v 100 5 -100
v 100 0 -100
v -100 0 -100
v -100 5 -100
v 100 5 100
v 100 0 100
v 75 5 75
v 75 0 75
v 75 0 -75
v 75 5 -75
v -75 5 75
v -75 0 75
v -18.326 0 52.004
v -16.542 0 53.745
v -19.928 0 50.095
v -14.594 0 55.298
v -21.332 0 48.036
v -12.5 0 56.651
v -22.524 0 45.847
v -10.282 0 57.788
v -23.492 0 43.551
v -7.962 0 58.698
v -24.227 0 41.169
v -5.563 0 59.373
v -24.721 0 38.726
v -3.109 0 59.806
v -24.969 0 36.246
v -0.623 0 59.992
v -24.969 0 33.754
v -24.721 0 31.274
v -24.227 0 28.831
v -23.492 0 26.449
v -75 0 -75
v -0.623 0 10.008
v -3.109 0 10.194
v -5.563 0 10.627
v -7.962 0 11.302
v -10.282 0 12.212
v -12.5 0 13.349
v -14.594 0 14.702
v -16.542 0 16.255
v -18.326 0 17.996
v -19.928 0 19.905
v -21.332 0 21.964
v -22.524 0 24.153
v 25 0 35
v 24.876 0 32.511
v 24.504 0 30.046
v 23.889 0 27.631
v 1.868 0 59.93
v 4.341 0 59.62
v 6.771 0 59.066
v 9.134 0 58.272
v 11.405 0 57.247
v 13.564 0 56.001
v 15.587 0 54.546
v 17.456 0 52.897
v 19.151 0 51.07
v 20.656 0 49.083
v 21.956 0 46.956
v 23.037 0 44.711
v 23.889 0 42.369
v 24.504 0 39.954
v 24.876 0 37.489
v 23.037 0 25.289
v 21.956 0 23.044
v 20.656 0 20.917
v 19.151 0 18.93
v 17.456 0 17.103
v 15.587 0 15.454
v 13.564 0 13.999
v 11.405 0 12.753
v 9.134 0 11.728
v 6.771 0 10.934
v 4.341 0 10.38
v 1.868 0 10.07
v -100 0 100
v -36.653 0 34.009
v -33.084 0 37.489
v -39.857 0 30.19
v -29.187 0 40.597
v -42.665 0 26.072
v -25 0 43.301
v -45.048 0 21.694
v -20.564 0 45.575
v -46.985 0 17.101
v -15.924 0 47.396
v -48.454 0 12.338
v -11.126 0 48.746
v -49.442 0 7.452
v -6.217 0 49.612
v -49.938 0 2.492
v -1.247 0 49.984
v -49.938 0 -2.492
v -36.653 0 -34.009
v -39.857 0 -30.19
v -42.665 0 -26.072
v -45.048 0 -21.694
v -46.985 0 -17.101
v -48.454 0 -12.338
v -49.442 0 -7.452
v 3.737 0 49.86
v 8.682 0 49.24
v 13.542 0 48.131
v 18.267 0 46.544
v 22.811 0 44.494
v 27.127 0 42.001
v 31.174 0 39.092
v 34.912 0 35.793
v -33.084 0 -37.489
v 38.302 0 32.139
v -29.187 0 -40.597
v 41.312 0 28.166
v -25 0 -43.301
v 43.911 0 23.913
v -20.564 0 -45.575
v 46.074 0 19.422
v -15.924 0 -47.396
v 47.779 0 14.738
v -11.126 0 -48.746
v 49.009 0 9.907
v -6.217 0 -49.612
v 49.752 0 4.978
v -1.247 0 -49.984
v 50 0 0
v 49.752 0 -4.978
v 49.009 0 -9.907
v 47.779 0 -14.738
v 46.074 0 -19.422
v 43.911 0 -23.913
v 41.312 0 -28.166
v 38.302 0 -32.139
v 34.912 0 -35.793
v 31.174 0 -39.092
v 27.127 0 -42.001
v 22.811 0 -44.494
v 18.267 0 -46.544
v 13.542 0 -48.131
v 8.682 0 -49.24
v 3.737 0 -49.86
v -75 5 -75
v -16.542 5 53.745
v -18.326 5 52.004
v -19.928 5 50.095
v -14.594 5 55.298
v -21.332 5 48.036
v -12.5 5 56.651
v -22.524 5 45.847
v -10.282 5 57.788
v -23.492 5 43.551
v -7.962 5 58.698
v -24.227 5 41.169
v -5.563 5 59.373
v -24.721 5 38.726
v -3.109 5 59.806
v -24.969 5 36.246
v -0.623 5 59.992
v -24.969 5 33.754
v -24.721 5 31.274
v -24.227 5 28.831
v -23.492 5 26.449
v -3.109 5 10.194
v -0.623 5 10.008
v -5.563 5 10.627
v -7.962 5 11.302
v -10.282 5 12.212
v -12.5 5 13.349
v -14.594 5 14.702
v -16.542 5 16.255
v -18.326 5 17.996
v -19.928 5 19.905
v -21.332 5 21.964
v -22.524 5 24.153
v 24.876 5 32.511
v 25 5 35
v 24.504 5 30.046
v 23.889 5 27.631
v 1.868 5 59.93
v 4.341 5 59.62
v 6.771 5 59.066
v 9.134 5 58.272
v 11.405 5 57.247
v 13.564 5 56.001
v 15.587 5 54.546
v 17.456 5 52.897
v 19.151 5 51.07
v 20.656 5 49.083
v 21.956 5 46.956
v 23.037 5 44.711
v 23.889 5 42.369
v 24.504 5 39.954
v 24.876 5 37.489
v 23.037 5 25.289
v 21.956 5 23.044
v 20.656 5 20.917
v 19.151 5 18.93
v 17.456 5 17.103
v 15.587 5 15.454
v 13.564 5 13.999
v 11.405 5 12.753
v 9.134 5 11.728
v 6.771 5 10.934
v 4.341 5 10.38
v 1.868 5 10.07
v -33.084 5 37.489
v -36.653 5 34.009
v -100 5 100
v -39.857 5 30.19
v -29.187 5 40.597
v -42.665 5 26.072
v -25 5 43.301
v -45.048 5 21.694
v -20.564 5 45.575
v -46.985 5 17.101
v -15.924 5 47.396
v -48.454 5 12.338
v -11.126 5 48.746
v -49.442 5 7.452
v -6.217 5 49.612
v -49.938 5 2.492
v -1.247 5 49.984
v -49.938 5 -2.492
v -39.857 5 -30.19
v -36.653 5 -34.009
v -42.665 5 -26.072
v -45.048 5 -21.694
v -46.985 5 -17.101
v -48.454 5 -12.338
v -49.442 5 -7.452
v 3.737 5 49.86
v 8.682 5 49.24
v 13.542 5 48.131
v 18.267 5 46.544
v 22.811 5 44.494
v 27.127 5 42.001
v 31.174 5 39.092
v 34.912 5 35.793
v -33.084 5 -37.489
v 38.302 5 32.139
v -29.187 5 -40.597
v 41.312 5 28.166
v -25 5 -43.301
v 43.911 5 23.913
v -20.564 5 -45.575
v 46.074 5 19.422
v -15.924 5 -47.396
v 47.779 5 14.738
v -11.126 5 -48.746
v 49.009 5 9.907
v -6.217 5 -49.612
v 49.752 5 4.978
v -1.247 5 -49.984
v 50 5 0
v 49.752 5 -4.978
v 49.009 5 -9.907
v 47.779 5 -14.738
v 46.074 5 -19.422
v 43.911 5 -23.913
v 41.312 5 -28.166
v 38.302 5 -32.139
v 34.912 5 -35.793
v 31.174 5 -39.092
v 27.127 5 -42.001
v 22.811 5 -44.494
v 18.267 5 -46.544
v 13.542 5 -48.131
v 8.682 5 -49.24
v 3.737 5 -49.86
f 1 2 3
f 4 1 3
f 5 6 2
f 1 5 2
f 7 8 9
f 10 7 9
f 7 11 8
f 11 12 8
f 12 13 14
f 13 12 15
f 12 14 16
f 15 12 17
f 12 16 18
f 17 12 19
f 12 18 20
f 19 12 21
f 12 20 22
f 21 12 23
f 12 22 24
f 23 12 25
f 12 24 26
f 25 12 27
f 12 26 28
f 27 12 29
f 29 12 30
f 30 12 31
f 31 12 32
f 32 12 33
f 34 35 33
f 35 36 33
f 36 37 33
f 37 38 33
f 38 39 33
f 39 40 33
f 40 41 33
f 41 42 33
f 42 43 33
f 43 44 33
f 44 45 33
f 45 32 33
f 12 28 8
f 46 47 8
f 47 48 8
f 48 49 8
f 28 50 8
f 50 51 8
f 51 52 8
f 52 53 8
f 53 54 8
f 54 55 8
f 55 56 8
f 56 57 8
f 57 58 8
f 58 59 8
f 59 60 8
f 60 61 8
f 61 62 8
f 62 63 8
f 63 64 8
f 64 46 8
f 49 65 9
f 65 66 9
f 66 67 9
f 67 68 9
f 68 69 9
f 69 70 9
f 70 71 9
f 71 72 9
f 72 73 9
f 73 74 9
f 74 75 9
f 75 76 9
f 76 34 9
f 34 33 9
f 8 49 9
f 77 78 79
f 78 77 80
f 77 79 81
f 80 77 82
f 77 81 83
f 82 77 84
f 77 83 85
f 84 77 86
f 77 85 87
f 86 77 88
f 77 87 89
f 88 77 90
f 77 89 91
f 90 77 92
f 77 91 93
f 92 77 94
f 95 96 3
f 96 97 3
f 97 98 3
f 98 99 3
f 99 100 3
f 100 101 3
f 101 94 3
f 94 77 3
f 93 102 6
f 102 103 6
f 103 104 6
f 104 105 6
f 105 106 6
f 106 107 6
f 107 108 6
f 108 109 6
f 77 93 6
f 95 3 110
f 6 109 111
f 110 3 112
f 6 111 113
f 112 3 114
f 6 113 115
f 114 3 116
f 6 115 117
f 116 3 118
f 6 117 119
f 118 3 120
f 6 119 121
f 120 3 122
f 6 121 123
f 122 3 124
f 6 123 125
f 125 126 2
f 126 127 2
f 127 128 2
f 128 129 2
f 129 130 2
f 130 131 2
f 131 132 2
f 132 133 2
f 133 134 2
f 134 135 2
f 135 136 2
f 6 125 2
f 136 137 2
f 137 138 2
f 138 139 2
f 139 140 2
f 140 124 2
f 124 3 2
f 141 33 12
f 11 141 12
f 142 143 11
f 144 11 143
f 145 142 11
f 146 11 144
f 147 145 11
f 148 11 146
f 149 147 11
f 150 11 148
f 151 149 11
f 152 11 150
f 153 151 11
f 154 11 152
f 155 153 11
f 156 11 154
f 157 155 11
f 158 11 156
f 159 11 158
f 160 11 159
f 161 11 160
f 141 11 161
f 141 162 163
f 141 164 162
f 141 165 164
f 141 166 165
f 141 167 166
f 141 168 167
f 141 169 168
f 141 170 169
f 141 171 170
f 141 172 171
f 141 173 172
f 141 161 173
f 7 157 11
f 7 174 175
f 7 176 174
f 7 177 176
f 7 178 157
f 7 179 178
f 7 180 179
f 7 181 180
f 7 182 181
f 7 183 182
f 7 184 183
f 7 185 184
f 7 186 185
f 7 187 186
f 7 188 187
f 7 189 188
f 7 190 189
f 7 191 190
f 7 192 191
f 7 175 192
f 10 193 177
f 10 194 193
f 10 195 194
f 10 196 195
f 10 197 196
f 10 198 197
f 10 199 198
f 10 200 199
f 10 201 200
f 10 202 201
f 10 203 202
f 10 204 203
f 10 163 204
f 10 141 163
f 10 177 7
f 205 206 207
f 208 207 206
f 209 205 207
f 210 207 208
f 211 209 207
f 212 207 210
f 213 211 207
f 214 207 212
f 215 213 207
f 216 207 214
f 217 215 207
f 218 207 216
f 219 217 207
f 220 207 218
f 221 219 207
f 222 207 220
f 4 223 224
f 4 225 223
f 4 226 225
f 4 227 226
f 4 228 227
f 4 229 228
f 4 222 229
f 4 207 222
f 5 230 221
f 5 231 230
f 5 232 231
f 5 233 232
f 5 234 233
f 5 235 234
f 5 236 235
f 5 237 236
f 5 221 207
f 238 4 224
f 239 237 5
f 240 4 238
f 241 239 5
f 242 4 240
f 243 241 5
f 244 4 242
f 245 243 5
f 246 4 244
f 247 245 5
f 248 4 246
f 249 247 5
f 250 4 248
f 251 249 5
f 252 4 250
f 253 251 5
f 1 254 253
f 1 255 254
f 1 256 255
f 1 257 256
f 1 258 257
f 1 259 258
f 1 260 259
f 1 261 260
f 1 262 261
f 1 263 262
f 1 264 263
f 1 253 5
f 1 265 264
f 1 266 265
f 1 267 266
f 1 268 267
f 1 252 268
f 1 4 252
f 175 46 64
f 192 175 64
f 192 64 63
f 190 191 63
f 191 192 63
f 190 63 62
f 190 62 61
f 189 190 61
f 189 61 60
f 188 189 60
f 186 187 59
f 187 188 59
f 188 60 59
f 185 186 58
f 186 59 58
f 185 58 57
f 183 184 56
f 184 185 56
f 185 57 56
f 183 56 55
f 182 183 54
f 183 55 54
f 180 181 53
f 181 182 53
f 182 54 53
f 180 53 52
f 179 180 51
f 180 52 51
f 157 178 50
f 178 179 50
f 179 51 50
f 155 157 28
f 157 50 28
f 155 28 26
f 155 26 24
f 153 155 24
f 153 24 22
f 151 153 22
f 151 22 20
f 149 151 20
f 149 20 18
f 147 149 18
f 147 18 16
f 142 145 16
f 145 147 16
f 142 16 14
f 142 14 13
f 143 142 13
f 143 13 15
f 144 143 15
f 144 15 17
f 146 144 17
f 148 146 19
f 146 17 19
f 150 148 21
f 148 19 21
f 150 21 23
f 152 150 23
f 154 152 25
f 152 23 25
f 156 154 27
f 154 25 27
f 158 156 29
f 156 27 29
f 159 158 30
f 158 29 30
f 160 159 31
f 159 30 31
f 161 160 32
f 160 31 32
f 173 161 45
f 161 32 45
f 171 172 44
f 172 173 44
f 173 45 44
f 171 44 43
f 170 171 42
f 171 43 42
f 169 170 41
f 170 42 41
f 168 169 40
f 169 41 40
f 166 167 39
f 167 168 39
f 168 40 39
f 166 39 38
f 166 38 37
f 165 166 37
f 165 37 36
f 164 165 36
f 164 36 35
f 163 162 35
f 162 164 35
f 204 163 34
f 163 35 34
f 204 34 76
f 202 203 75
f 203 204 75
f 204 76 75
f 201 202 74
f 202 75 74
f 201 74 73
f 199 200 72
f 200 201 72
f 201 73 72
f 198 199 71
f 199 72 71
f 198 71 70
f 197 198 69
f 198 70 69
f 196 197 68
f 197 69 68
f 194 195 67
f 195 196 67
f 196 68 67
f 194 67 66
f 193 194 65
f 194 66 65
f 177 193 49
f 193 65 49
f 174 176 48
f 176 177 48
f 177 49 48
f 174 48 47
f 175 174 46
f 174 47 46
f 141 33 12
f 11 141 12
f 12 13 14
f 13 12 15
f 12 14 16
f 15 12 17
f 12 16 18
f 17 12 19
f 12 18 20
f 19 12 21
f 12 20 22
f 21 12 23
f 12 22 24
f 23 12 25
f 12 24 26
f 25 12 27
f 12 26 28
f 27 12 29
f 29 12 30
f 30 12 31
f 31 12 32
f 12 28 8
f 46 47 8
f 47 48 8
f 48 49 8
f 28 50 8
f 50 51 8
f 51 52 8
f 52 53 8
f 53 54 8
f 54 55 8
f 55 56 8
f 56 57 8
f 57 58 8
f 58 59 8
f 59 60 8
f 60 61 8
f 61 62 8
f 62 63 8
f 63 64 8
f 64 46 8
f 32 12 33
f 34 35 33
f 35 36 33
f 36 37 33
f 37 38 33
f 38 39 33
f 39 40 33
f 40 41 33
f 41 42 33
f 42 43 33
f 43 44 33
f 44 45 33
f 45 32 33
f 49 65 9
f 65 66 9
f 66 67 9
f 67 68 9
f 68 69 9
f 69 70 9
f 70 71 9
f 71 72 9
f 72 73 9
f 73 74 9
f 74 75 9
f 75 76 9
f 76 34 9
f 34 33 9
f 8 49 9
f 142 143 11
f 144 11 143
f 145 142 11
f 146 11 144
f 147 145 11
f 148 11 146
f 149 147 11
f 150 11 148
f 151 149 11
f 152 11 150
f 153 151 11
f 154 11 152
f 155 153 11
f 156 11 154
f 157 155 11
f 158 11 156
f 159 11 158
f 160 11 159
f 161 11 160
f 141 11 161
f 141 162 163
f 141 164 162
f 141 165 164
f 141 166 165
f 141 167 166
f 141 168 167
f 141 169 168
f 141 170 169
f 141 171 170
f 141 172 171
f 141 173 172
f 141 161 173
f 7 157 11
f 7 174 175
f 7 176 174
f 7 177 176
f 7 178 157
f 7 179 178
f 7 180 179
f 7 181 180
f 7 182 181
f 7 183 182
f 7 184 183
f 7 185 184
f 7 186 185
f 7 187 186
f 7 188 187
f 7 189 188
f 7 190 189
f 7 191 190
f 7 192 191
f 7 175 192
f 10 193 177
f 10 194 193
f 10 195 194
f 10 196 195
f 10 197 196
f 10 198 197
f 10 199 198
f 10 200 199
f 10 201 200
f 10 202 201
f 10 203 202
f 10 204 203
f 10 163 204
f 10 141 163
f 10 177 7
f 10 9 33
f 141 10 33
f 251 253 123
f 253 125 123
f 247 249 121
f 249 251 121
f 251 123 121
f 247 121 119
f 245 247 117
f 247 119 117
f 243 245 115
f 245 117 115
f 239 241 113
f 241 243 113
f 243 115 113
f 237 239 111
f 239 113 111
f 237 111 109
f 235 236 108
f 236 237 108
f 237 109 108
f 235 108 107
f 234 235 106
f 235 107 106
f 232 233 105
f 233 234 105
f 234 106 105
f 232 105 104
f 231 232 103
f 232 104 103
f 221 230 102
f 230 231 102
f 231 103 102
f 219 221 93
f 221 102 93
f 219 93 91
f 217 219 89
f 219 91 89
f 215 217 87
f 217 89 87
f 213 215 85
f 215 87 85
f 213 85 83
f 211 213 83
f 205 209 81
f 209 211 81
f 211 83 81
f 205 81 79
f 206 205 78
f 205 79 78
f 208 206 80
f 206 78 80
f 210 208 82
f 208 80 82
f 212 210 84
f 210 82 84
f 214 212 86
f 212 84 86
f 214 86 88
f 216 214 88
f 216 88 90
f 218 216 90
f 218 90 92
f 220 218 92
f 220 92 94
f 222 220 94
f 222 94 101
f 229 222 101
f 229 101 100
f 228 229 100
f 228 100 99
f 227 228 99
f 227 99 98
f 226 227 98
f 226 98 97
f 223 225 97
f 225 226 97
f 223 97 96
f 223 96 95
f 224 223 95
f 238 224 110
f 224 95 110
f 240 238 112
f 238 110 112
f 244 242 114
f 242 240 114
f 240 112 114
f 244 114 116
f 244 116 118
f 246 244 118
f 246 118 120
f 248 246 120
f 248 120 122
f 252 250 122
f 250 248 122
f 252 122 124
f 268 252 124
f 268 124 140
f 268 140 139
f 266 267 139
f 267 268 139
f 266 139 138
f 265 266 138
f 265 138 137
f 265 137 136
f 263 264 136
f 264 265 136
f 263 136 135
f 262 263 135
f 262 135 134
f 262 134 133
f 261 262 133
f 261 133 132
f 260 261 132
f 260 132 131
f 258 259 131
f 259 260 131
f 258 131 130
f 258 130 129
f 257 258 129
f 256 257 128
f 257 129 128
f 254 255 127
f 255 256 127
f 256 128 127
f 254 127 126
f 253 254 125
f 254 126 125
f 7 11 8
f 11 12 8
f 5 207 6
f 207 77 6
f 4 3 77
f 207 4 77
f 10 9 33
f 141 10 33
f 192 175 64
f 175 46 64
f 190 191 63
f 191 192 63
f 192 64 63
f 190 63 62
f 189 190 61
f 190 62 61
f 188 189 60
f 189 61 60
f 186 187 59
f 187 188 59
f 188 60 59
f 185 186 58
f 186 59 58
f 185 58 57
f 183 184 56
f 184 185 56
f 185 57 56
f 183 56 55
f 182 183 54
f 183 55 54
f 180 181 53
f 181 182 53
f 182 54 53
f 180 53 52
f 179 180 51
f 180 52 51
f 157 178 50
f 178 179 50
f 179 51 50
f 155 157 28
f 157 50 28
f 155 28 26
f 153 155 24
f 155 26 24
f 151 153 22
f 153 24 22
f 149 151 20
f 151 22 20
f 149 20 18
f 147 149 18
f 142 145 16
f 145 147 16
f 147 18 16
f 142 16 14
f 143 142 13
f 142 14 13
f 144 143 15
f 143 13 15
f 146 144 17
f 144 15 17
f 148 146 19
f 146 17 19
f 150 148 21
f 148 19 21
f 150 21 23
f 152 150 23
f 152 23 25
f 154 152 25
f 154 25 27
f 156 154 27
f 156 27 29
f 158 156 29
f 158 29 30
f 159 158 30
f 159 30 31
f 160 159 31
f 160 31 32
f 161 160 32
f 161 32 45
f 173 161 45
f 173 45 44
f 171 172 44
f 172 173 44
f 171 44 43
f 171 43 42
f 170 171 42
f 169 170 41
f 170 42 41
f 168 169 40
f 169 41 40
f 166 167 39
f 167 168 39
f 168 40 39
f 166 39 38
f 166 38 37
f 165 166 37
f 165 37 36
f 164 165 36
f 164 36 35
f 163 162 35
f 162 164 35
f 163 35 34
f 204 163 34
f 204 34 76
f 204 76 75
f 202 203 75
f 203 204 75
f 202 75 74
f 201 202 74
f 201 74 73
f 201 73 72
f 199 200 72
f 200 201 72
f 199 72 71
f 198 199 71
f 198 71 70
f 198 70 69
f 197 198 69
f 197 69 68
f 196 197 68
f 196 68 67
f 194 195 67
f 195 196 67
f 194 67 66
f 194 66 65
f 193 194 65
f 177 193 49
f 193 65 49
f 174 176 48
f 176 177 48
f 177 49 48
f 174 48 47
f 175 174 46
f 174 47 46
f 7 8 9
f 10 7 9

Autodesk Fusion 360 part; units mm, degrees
sketch "Sketch1" plane through (0, 0, 0) normal (0, 1, 0) x (1, 0, 0) in component "Design Intent 1"
  line L0 (100, 100) -> (-100, 100)
  line L1 (-100, 100) -> (-100, -100)
  line L2 (-100, -100) -> (100, -100)
  line L3 (100, -100) -> (100, 100)
  line L4 (100, 100) -> (-100, -100) construction
  line L5 (-100, 100) -> (100, -100) construction
  circle A0 centre (0, 0) radius 50
  dimension "d1" = 200
  dimension "d2" = 100
extrude "Extrude1" add sketch "Sketch1" along normal blind 5 makes body 1 in component "Design Intent 1"
sketch "Sketch1 (2)" plane through (0, 0, 0) normal (0, 1, 0) x (1, 0, 0) in component "Design Intent 2"
  line L0 (75, 75) -> (-75, 75)
  line L1 (-75, 75) -> (-75, -75)
  line L2 (-75, -75) -> (75, -75)
  line L3 (75, -75) -> (75, 75)
  line L4 (75, 75) -> (-75, -75) construction
  line L5 (-75, 75) -> (75, -75) construction
  circle A0 centre (0, -35) radius 25
  dimension "d1_1" = 150
  dimension "d2_1" = 50
  dimension "d5" = 40
extrude "Extrude2" add sketch "Sketch1 (2)" along normal blind 5 separate body makes body 2 in component "Design Intent 1"
extrude "Extrude2'" add sketch "Sketch1 (2)" along normal blind 5 separate body makes body 3 in component "Design Intent 2"
extrude "Extrude1'" add sketch "Sketch1 (2)" along normal blind 5 separate body makes body 4 in component "Design Intent 2"
component "Design Intent 1" placed x (1, 0, 0) y (0, 1, 0) z (0, 0, 1) at (0, 0, 0)
component "Design Intent 2" placed x (1, 0, 0) y (0, 1, 0) z (0, 0, 1) at (0, 0, 0)
hidden bodies 2
equation "d2 = d1 / 2"
